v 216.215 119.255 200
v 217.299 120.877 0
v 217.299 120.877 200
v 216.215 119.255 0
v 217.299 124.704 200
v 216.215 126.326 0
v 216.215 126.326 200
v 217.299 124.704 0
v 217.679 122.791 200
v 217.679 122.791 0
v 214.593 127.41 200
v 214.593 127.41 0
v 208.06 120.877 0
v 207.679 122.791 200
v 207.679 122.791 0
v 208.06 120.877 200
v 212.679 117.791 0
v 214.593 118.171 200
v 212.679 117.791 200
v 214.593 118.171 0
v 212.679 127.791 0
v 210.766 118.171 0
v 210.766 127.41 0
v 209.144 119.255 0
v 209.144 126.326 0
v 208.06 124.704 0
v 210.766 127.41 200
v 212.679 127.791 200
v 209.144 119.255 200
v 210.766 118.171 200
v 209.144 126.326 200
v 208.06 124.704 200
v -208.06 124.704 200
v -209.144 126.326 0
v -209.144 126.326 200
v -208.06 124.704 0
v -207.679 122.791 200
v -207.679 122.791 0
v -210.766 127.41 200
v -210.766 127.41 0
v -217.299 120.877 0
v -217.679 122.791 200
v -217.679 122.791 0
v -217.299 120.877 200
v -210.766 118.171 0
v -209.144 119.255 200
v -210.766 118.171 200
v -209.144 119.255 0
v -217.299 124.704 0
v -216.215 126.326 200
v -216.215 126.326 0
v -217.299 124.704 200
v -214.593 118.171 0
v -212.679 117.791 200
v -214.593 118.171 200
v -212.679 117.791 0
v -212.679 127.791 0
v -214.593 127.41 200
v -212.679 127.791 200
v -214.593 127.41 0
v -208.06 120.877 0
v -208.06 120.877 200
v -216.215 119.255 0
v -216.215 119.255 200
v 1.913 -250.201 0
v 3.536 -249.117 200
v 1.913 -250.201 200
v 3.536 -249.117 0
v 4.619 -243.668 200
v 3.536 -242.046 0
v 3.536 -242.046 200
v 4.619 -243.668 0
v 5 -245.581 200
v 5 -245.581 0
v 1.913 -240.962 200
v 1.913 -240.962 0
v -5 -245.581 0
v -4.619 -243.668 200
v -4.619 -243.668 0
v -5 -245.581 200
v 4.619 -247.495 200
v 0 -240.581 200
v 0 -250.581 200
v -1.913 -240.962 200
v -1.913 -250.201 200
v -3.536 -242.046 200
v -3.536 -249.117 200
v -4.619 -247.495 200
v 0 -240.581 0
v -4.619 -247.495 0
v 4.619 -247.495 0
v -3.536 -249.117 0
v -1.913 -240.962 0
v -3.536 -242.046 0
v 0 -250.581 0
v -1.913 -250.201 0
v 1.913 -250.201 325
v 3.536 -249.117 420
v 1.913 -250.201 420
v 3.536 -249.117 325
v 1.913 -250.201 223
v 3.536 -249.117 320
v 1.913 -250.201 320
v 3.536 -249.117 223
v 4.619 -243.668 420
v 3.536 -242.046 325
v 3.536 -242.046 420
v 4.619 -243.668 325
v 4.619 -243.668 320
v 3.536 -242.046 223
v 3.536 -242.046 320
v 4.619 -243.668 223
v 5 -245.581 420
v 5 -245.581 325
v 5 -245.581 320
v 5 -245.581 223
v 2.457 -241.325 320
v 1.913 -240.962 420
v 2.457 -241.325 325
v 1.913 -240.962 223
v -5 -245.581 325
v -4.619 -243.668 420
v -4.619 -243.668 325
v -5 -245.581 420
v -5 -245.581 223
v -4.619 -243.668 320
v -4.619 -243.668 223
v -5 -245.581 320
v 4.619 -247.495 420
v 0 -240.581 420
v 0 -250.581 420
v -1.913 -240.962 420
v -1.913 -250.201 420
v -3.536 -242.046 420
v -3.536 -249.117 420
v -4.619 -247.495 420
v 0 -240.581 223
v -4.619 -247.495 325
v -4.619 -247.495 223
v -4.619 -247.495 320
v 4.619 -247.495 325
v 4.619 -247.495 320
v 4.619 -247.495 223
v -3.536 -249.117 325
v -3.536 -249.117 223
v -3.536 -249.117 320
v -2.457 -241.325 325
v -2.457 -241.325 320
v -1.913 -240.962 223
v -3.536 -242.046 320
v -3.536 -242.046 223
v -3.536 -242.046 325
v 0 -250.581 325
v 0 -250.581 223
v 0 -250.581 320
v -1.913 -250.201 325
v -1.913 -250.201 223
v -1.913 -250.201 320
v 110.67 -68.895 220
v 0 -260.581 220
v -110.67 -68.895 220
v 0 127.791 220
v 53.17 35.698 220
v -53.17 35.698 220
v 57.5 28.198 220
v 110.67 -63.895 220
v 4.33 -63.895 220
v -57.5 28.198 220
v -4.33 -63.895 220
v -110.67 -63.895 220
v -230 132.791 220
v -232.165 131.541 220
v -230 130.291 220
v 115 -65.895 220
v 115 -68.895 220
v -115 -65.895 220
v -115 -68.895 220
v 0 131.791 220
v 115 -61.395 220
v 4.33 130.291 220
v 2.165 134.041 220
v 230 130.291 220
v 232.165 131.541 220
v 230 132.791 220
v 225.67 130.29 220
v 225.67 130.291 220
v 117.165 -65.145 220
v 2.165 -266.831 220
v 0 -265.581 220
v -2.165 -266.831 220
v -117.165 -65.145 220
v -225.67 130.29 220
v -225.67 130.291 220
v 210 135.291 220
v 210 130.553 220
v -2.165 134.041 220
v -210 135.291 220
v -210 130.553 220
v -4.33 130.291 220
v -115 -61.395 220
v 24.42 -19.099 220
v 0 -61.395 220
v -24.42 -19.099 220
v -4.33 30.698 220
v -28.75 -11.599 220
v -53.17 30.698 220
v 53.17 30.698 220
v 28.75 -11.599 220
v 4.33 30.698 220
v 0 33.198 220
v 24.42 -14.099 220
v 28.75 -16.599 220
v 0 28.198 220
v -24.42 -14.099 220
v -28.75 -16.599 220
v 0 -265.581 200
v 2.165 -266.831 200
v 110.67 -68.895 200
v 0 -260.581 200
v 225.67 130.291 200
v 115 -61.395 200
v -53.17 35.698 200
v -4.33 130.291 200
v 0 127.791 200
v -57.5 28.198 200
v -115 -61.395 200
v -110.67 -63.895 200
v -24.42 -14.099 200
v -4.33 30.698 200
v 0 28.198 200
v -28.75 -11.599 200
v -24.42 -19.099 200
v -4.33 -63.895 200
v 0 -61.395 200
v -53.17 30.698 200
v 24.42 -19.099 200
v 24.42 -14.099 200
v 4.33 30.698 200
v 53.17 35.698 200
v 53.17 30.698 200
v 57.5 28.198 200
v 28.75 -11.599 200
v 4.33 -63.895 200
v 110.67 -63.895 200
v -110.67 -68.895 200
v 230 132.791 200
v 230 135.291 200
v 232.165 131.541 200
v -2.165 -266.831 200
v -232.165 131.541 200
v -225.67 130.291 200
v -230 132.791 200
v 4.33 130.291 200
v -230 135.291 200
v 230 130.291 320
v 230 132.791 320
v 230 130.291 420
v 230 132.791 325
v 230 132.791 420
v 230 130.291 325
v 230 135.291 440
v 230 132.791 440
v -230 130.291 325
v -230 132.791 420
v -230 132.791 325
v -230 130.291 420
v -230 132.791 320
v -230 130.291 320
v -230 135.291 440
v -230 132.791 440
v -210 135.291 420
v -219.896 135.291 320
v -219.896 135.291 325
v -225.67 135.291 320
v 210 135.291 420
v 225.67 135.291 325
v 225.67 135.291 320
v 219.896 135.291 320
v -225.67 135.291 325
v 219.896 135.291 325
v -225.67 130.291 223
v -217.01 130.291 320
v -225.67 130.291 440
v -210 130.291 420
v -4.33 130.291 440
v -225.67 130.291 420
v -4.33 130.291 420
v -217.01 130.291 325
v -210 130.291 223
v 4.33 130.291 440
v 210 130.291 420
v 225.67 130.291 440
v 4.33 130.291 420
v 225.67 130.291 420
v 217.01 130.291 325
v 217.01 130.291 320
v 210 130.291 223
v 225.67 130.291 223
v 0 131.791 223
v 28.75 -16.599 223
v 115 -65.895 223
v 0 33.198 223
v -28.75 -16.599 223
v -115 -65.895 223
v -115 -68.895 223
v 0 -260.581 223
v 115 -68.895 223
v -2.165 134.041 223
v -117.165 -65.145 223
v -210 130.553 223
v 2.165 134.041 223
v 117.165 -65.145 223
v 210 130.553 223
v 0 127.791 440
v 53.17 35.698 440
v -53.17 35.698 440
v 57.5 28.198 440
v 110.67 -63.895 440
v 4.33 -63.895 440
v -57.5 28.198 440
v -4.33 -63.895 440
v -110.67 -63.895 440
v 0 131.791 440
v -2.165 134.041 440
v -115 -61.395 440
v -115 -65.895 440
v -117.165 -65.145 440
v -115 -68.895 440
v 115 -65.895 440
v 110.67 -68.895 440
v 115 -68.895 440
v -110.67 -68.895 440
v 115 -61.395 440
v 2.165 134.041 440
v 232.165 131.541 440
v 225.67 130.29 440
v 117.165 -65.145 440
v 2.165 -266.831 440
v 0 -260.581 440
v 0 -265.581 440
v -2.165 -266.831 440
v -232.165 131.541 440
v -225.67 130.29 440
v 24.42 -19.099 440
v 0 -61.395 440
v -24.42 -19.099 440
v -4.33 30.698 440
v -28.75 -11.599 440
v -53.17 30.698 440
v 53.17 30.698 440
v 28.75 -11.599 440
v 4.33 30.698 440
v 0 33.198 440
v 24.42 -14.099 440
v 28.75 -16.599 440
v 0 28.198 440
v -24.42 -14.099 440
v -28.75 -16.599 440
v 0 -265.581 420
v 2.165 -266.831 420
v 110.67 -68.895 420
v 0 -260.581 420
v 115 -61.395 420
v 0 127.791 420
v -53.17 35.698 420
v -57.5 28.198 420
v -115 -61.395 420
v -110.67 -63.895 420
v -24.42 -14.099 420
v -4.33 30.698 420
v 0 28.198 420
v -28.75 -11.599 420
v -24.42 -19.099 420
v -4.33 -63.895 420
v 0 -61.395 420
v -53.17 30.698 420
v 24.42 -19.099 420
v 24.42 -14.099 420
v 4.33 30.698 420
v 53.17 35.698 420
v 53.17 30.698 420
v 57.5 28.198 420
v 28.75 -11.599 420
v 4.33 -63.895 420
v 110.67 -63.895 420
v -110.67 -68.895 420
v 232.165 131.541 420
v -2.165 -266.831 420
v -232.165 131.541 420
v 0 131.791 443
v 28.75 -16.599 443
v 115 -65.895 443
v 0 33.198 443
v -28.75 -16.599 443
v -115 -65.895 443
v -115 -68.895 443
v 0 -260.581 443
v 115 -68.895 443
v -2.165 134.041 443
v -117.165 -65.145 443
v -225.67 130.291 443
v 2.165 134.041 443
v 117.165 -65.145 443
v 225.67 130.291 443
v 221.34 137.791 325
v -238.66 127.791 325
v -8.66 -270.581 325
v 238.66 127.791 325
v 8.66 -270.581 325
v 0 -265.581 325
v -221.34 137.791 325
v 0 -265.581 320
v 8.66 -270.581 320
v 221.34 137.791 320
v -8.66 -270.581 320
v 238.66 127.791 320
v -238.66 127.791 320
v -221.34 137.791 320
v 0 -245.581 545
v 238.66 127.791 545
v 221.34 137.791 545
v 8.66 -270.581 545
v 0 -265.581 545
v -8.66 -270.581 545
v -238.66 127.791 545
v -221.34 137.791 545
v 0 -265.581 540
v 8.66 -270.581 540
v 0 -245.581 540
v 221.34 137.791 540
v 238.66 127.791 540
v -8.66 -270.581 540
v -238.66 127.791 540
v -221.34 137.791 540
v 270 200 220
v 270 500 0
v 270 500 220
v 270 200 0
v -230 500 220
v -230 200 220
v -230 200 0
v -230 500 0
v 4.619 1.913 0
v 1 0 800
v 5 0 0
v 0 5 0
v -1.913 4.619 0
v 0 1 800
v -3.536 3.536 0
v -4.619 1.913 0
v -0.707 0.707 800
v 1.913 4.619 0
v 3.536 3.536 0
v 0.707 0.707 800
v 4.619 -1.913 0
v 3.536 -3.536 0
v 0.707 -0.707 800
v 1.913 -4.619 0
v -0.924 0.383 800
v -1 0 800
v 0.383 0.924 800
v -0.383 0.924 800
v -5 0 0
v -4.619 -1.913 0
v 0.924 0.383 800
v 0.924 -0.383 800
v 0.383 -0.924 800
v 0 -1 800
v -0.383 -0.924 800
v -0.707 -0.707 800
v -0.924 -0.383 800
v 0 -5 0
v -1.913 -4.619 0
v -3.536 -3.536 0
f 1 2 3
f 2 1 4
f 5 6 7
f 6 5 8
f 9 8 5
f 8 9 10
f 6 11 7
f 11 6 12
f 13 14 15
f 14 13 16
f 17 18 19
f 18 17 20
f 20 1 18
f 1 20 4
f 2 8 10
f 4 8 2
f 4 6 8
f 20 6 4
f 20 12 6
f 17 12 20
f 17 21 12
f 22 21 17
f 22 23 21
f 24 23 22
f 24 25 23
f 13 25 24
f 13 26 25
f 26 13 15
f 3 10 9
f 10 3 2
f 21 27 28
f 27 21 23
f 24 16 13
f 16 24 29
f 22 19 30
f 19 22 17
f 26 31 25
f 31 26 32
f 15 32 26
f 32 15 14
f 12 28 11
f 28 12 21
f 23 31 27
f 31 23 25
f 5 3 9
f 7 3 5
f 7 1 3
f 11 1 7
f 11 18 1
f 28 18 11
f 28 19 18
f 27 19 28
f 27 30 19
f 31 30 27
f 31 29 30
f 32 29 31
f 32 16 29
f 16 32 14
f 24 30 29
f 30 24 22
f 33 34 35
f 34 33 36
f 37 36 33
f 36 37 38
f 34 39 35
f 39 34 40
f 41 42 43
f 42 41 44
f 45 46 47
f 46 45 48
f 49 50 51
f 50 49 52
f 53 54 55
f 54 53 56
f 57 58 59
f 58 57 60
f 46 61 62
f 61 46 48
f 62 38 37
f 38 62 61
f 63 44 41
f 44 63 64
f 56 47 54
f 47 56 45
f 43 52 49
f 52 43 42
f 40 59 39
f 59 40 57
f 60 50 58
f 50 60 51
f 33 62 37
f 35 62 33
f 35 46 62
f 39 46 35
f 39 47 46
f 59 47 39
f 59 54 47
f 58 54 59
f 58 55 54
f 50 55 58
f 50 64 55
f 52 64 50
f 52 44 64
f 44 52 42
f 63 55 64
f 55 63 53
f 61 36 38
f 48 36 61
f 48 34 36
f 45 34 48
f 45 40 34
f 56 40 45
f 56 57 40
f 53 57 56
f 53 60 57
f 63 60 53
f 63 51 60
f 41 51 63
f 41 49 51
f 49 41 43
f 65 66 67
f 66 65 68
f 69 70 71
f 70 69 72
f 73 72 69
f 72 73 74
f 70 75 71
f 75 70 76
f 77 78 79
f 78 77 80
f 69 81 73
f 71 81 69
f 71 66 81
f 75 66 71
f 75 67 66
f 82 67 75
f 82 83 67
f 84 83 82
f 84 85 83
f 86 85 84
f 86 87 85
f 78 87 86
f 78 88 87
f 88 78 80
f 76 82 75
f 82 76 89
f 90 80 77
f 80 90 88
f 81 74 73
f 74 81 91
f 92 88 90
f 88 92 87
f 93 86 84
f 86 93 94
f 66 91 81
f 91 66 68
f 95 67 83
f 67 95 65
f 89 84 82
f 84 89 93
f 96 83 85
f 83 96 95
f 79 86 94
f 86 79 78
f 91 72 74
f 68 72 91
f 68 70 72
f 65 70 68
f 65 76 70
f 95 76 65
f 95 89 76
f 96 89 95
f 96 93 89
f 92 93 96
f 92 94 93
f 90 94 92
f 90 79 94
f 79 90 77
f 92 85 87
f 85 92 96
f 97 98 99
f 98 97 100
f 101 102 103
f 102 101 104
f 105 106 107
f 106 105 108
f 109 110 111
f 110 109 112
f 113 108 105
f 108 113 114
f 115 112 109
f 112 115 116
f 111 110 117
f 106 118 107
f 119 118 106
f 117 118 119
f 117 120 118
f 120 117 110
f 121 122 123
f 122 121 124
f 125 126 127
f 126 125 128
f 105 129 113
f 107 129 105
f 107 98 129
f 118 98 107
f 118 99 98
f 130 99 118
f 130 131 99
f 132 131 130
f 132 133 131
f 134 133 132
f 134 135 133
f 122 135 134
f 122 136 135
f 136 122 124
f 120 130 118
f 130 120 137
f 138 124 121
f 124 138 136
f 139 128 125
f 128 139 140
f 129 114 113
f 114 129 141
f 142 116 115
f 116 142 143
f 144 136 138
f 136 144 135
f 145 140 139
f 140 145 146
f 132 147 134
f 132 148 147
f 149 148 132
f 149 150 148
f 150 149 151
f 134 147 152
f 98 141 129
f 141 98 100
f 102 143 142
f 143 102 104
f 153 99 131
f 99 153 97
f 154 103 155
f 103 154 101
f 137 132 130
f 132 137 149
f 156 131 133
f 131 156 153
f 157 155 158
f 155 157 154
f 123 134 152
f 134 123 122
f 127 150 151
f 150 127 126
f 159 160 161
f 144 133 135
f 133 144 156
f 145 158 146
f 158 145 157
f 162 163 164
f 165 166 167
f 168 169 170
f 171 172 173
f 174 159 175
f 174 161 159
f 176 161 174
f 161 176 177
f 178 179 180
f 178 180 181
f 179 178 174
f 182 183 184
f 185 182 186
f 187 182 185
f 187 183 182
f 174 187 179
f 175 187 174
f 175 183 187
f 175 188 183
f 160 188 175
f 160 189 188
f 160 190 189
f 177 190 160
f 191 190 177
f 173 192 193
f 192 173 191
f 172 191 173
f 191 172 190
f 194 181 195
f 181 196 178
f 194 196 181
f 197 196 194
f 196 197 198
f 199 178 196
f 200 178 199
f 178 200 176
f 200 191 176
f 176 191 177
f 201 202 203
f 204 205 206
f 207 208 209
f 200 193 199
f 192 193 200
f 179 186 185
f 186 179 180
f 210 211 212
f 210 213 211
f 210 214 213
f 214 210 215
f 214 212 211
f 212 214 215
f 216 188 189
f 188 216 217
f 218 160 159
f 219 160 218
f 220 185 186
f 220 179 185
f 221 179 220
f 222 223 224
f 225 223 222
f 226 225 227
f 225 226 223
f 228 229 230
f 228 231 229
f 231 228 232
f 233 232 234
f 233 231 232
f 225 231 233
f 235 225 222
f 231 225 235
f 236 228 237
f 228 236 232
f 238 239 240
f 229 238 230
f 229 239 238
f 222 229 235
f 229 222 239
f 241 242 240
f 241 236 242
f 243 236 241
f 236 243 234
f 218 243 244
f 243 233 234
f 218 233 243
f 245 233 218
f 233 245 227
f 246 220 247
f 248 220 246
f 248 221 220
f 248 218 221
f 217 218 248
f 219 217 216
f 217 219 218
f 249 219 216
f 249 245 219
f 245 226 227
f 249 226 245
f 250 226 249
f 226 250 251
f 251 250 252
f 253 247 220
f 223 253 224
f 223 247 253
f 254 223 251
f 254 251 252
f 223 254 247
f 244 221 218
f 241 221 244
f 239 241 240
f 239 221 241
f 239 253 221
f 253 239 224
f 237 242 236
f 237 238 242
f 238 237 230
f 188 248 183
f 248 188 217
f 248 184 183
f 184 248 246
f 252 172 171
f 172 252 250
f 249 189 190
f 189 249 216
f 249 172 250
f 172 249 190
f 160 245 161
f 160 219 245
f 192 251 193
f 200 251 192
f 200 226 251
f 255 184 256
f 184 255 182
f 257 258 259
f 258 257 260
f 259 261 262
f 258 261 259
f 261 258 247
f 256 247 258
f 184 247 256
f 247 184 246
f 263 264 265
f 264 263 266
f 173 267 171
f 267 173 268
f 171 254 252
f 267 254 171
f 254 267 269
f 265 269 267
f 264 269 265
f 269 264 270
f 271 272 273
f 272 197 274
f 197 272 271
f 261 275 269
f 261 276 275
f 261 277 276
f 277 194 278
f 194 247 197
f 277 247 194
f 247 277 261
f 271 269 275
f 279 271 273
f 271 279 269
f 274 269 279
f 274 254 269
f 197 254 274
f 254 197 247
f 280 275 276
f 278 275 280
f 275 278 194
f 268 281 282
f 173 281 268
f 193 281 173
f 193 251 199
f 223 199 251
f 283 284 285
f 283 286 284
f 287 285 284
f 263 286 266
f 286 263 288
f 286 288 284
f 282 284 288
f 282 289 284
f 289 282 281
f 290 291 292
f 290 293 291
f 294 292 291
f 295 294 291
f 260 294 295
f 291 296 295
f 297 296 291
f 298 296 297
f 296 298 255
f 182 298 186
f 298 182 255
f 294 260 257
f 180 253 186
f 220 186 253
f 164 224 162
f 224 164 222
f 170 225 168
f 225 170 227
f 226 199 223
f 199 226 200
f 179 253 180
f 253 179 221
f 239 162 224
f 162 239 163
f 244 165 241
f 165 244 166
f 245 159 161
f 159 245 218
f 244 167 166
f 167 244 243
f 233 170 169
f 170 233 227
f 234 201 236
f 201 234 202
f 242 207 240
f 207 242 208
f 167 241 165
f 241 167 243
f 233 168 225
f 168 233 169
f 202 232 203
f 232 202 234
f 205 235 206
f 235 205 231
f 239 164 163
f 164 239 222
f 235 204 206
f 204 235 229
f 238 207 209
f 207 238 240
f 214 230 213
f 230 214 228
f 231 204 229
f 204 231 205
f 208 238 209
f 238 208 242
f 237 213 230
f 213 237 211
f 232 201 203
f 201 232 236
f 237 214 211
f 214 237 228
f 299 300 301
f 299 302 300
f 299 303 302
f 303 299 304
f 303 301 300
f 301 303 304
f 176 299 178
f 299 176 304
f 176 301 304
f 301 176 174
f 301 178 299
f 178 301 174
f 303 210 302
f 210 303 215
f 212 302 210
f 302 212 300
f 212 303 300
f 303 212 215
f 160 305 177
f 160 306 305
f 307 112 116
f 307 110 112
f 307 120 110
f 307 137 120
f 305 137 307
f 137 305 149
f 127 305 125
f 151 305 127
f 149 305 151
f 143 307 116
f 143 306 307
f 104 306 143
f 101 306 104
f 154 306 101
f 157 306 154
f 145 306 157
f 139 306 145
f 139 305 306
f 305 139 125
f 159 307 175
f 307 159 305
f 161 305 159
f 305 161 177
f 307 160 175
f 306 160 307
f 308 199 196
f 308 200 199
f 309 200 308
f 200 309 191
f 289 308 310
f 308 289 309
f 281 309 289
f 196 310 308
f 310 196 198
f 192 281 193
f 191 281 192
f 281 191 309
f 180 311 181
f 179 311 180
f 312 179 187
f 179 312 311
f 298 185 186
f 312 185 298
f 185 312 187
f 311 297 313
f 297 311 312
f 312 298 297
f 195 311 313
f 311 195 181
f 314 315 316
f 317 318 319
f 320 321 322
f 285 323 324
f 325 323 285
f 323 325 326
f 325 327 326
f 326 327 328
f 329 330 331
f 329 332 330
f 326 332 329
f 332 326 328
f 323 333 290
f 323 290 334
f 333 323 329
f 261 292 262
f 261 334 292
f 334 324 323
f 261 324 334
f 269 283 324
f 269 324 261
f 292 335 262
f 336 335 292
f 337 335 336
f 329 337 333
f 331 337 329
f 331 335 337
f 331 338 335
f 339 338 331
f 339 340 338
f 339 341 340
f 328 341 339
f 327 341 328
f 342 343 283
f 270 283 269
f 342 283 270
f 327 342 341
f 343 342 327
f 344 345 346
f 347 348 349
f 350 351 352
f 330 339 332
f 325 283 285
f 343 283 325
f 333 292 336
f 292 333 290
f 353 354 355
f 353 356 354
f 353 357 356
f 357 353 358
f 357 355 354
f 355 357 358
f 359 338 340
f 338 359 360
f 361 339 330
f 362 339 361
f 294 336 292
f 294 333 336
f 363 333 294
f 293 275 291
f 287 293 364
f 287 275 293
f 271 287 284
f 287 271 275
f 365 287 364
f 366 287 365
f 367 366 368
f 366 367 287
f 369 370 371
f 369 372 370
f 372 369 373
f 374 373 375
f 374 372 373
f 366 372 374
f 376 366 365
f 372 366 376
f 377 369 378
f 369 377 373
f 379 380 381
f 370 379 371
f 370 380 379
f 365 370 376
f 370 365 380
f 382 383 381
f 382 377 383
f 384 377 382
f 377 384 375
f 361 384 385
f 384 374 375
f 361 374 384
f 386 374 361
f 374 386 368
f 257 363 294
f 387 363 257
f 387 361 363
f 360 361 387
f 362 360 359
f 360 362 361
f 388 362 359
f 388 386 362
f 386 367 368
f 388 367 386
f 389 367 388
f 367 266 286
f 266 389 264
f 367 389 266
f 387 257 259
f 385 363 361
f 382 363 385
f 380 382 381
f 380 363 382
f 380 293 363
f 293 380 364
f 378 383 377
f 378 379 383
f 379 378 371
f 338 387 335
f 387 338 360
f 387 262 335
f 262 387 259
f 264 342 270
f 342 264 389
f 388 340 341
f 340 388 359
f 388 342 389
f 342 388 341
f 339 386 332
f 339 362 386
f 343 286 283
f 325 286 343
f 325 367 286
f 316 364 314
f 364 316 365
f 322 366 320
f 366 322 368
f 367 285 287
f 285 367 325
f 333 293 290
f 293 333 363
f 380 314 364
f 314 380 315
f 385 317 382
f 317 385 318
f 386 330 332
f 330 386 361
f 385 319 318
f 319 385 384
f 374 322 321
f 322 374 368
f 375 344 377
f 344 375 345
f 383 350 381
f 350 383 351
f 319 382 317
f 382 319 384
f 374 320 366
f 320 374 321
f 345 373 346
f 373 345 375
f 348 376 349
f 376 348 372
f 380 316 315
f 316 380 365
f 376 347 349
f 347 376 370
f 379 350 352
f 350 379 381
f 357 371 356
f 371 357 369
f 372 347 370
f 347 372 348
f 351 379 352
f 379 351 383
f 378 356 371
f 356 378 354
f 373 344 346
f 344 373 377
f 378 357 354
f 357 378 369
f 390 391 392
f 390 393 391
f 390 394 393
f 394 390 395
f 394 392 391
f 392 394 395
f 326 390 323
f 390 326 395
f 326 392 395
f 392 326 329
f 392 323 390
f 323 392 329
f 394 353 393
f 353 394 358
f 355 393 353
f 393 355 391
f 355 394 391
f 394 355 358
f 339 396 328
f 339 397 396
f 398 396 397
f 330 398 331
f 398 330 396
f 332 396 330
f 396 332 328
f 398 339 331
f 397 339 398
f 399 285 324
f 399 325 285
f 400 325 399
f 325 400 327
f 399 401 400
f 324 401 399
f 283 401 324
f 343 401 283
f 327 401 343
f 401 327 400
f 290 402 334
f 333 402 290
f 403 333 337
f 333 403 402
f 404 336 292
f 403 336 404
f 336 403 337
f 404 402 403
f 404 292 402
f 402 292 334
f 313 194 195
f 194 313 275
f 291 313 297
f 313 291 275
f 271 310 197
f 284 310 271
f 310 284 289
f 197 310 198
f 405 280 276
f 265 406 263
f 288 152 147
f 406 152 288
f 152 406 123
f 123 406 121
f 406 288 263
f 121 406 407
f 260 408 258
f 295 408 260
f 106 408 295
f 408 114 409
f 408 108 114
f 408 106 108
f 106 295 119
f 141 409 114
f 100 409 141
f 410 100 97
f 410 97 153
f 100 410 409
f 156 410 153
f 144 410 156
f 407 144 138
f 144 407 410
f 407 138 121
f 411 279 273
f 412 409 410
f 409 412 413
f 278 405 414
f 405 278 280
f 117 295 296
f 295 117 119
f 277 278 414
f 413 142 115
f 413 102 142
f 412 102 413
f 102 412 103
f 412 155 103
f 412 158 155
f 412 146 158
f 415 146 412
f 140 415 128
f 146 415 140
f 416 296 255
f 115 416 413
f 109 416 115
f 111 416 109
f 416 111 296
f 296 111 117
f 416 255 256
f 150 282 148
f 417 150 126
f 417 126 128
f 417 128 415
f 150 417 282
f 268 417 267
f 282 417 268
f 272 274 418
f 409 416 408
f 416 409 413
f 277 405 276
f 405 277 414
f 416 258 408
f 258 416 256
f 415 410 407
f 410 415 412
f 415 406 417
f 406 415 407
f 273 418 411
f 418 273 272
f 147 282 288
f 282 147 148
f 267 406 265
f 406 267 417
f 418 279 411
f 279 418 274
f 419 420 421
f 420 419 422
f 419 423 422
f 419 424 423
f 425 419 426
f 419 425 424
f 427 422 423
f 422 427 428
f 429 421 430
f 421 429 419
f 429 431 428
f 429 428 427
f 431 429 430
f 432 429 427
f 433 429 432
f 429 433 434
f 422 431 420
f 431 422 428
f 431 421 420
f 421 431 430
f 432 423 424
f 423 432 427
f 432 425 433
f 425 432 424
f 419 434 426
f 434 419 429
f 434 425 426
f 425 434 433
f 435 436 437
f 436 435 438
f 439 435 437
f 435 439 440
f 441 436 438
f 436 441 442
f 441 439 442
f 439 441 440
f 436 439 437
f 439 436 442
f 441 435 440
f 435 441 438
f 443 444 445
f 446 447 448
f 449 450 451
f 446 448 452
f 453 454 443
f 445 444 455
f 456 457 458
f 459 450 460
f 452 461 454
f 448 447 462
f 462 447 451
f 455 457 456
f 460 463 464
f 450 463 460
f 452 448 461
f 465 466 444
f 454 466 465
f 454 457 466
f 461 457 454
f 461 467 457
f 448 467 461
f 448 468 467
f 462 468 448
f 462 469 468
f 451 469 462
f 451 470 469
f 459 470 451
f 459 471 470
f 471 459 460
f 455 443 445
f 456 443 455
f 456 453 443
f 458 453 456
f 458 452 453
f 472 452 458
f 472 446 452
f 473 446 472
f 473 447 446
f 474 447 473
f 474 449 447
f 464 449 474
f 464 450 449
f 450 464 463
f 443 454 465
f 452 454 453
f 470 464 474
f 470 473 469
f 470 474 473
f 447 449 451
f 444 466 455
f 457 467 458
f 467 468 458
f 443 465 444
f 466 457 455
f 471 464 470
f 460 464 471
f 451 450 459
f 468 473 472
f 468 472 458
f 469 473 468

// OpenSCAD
// file: level.scad
// Уровень этажа
module level() {
    bars(1);
    rotate([0, 0, 180]) bars(2);
    bars(4);
    rotate([0, 0, 180]) bars(8); 
    floorWithHole();
    translate([0, -tRadius/2, 0]) 
      rotate(180, 0, 0) floor();
    translate([-tSide/4, tRadius/4, 0]) 
      rotate(60, 0, 0) floor();    
    translate([tSide/4, tRadius/4, 0]) 
      rotate(300, 0, 0) floor();
    table();
}
// file: railingBars.scad
// Брус ограды
module railBar() {
  color("LightYellow", 1.0) 
    translate([0, -barH/2, 0]) 
      cube([tSide, barH, barW], false);
}


// Ограда этажа
module railingBars() {
    translate([0, -tRadius, 0]) 
      rotate(60, 0, 0) 
      railBar();
    translate([0, -tRadius, 0]) 
      rotate(120, 0, 0) 
      railBar();    
}
// file: floors.scad
// Пол-треугольник вокруг Ёлки 
module floorWithHole() {
  tradius =  tRadius - floorGap; 
  translate([0, 0, barH])
    linear_extrude(floorW)
    color("LightYellow4") polygon(points=[
      [0, tradius/2],
      [-tSide/4 , -tradius/4],    
      [ tSide/4, -tradius/4],
      [0, tRadius/8],
      [-tSide/16, -tRadius/16],    
      [ tSide/16, -tRadius/16],
    ],
    paths = [[0,1,2], [3,4,5]],
    convexity = 10
  );
}

// Пол-треугольник
module floor() {
  tradius =  tRadius - 10; 
  translate([0, 0, barH])
  linear_extrude(floorW)
    color("LightYellow") polygon(points=[
      [0, tradius/2],
      [-tSide/4, -tradius/4],    
      [ tSide/4, -tradius/4]
    ],
    paths = [[0,1,2]],
    convexity = 10
  );
}
// file: table.scad
// Секция стола
module tableSegment() {
  l = tSide / 16;
    color([1,1,1]) polygon(points=[
      [l, 0],
      [l*(1+sin(30)), l+cos(30)],
      [0, l*cos(30)/sin(30)],
      [-l*(1+sin(30)), l+cos(30)],
      [-l, 0]
    ]);
}

// Стол
module table() {
    rotate(180, 0, 0)  translate([0, (tSide/16)*(sin(30)/cos(30)), hTable]) tableSegment();
    rotate(60, 0, 0)  translate([0, (tSide/16)*(sin(30)/cos(30)), hTable]) tableSegment();
    rotate(-60, 0, 0)  translate([0, (tSide/16)*(sin(30)/cos(30)), hTable]) tableSegment();
}
// file: bars.scad
// Брус треугольника
module bar(scale) {
  color("LightYellow", 1.0) 
    translate([0, -barW/2, 0]) 
      cube([tSide / scale, barW, barH], false);
}

// Треугольник из брусьев
module bars(scale) {
  translate([0, -tRadius/scale, 0]) 
    rotate([0, 0, 60]) 
    bar(scale);
  translate([0, -tRadius/scale, 0]) 
    rotate([0, 0, 120]) 
    bar(scale);
  translate([-tSide/(2*scale), tRadius/(2*scale), 0]) rotate([0, 0, 0]) 
    bar(scale);
}
// file: pillars.scad
// Стойка с площадкой
module pillar() {
  color("Silver") cylinder(r = pillarDiam/2 , h = pillarHeight, center = false);
  color("Silver") translate([-10, -10, pillarHeight]) square(footSize,1,false);
}

// задний опорный брус
module pillarBar(h) { 
  color("LightYellow", 1.0) 
    translate([0, -barW/2, 0]) 
      cube([barH, barW, h], false);    
}

// Задние опорные брусья 
module pillarBars() {
  translate([tSide/2 - barH, tRadius/2, pillarHeight+barH]) 
    pillarBar(pillarHeight);
  translate([-tSide/2, tRadius/2, pillarHeight+barH]) 
    pillarBar(pillarHeight);    
}

// Опорные стойки
module pillars() {
    pRadius = tRadius - footSize;
    translate([pRadius * cos(30), pRadius * sin(30), 0]) 
      pillar();
    translate([pRadius * cos(150), pRadius * sin(150), 0])
      pillar();
    translate([pRadius * cos(270), pRadius * sin(270), 0])
      pillar();
    // Передняя стойка второго этажа
    translate([pRadius * cos(270), pRadius * sin(270), pillarHeight+barH])
      pillar();
}
// file: fir.scad
// Елка
module fir() {
  color("Brown") cylinder(firHeight, firDiam/2);
}
// file: sauna.scad
module sauna() {
  translate([-tSide/2, 200, 0]) color("Gray", 0.2)  
    cube([500, 300, 220], false); 
}
// main file
tSide = 460;
tRadius = (tSide /2) / cos(30);

firHeight = 800;
firDiam =  10;

pillarDiam = 10;
pillarHeight = 200;
footSize = 20;

barW = 5;
barH = 20;  

floorW = 3;
floorGap = 2;

hTable=70;

railingH = 100;

include <sauna.scad>;
include <fir.scad>;
include <pillars.scad>;
include <bars.scad>;
include <table.scad>;
include <floors.scad>;
include <railingBars.scad>;
include <level.scad>;

sauna();
fir();
pillars();
translate([0, 0, pillarHeight]) level();
translate([0, 0, 2*pillarHeight+barH]) level();
pillarBars();
translate([0, 0, pillarHeight+barH+railingH])
    railingBars();
translate([0, 0, 2*pillarHeight+2*barH+railingH])
    railingBars();
